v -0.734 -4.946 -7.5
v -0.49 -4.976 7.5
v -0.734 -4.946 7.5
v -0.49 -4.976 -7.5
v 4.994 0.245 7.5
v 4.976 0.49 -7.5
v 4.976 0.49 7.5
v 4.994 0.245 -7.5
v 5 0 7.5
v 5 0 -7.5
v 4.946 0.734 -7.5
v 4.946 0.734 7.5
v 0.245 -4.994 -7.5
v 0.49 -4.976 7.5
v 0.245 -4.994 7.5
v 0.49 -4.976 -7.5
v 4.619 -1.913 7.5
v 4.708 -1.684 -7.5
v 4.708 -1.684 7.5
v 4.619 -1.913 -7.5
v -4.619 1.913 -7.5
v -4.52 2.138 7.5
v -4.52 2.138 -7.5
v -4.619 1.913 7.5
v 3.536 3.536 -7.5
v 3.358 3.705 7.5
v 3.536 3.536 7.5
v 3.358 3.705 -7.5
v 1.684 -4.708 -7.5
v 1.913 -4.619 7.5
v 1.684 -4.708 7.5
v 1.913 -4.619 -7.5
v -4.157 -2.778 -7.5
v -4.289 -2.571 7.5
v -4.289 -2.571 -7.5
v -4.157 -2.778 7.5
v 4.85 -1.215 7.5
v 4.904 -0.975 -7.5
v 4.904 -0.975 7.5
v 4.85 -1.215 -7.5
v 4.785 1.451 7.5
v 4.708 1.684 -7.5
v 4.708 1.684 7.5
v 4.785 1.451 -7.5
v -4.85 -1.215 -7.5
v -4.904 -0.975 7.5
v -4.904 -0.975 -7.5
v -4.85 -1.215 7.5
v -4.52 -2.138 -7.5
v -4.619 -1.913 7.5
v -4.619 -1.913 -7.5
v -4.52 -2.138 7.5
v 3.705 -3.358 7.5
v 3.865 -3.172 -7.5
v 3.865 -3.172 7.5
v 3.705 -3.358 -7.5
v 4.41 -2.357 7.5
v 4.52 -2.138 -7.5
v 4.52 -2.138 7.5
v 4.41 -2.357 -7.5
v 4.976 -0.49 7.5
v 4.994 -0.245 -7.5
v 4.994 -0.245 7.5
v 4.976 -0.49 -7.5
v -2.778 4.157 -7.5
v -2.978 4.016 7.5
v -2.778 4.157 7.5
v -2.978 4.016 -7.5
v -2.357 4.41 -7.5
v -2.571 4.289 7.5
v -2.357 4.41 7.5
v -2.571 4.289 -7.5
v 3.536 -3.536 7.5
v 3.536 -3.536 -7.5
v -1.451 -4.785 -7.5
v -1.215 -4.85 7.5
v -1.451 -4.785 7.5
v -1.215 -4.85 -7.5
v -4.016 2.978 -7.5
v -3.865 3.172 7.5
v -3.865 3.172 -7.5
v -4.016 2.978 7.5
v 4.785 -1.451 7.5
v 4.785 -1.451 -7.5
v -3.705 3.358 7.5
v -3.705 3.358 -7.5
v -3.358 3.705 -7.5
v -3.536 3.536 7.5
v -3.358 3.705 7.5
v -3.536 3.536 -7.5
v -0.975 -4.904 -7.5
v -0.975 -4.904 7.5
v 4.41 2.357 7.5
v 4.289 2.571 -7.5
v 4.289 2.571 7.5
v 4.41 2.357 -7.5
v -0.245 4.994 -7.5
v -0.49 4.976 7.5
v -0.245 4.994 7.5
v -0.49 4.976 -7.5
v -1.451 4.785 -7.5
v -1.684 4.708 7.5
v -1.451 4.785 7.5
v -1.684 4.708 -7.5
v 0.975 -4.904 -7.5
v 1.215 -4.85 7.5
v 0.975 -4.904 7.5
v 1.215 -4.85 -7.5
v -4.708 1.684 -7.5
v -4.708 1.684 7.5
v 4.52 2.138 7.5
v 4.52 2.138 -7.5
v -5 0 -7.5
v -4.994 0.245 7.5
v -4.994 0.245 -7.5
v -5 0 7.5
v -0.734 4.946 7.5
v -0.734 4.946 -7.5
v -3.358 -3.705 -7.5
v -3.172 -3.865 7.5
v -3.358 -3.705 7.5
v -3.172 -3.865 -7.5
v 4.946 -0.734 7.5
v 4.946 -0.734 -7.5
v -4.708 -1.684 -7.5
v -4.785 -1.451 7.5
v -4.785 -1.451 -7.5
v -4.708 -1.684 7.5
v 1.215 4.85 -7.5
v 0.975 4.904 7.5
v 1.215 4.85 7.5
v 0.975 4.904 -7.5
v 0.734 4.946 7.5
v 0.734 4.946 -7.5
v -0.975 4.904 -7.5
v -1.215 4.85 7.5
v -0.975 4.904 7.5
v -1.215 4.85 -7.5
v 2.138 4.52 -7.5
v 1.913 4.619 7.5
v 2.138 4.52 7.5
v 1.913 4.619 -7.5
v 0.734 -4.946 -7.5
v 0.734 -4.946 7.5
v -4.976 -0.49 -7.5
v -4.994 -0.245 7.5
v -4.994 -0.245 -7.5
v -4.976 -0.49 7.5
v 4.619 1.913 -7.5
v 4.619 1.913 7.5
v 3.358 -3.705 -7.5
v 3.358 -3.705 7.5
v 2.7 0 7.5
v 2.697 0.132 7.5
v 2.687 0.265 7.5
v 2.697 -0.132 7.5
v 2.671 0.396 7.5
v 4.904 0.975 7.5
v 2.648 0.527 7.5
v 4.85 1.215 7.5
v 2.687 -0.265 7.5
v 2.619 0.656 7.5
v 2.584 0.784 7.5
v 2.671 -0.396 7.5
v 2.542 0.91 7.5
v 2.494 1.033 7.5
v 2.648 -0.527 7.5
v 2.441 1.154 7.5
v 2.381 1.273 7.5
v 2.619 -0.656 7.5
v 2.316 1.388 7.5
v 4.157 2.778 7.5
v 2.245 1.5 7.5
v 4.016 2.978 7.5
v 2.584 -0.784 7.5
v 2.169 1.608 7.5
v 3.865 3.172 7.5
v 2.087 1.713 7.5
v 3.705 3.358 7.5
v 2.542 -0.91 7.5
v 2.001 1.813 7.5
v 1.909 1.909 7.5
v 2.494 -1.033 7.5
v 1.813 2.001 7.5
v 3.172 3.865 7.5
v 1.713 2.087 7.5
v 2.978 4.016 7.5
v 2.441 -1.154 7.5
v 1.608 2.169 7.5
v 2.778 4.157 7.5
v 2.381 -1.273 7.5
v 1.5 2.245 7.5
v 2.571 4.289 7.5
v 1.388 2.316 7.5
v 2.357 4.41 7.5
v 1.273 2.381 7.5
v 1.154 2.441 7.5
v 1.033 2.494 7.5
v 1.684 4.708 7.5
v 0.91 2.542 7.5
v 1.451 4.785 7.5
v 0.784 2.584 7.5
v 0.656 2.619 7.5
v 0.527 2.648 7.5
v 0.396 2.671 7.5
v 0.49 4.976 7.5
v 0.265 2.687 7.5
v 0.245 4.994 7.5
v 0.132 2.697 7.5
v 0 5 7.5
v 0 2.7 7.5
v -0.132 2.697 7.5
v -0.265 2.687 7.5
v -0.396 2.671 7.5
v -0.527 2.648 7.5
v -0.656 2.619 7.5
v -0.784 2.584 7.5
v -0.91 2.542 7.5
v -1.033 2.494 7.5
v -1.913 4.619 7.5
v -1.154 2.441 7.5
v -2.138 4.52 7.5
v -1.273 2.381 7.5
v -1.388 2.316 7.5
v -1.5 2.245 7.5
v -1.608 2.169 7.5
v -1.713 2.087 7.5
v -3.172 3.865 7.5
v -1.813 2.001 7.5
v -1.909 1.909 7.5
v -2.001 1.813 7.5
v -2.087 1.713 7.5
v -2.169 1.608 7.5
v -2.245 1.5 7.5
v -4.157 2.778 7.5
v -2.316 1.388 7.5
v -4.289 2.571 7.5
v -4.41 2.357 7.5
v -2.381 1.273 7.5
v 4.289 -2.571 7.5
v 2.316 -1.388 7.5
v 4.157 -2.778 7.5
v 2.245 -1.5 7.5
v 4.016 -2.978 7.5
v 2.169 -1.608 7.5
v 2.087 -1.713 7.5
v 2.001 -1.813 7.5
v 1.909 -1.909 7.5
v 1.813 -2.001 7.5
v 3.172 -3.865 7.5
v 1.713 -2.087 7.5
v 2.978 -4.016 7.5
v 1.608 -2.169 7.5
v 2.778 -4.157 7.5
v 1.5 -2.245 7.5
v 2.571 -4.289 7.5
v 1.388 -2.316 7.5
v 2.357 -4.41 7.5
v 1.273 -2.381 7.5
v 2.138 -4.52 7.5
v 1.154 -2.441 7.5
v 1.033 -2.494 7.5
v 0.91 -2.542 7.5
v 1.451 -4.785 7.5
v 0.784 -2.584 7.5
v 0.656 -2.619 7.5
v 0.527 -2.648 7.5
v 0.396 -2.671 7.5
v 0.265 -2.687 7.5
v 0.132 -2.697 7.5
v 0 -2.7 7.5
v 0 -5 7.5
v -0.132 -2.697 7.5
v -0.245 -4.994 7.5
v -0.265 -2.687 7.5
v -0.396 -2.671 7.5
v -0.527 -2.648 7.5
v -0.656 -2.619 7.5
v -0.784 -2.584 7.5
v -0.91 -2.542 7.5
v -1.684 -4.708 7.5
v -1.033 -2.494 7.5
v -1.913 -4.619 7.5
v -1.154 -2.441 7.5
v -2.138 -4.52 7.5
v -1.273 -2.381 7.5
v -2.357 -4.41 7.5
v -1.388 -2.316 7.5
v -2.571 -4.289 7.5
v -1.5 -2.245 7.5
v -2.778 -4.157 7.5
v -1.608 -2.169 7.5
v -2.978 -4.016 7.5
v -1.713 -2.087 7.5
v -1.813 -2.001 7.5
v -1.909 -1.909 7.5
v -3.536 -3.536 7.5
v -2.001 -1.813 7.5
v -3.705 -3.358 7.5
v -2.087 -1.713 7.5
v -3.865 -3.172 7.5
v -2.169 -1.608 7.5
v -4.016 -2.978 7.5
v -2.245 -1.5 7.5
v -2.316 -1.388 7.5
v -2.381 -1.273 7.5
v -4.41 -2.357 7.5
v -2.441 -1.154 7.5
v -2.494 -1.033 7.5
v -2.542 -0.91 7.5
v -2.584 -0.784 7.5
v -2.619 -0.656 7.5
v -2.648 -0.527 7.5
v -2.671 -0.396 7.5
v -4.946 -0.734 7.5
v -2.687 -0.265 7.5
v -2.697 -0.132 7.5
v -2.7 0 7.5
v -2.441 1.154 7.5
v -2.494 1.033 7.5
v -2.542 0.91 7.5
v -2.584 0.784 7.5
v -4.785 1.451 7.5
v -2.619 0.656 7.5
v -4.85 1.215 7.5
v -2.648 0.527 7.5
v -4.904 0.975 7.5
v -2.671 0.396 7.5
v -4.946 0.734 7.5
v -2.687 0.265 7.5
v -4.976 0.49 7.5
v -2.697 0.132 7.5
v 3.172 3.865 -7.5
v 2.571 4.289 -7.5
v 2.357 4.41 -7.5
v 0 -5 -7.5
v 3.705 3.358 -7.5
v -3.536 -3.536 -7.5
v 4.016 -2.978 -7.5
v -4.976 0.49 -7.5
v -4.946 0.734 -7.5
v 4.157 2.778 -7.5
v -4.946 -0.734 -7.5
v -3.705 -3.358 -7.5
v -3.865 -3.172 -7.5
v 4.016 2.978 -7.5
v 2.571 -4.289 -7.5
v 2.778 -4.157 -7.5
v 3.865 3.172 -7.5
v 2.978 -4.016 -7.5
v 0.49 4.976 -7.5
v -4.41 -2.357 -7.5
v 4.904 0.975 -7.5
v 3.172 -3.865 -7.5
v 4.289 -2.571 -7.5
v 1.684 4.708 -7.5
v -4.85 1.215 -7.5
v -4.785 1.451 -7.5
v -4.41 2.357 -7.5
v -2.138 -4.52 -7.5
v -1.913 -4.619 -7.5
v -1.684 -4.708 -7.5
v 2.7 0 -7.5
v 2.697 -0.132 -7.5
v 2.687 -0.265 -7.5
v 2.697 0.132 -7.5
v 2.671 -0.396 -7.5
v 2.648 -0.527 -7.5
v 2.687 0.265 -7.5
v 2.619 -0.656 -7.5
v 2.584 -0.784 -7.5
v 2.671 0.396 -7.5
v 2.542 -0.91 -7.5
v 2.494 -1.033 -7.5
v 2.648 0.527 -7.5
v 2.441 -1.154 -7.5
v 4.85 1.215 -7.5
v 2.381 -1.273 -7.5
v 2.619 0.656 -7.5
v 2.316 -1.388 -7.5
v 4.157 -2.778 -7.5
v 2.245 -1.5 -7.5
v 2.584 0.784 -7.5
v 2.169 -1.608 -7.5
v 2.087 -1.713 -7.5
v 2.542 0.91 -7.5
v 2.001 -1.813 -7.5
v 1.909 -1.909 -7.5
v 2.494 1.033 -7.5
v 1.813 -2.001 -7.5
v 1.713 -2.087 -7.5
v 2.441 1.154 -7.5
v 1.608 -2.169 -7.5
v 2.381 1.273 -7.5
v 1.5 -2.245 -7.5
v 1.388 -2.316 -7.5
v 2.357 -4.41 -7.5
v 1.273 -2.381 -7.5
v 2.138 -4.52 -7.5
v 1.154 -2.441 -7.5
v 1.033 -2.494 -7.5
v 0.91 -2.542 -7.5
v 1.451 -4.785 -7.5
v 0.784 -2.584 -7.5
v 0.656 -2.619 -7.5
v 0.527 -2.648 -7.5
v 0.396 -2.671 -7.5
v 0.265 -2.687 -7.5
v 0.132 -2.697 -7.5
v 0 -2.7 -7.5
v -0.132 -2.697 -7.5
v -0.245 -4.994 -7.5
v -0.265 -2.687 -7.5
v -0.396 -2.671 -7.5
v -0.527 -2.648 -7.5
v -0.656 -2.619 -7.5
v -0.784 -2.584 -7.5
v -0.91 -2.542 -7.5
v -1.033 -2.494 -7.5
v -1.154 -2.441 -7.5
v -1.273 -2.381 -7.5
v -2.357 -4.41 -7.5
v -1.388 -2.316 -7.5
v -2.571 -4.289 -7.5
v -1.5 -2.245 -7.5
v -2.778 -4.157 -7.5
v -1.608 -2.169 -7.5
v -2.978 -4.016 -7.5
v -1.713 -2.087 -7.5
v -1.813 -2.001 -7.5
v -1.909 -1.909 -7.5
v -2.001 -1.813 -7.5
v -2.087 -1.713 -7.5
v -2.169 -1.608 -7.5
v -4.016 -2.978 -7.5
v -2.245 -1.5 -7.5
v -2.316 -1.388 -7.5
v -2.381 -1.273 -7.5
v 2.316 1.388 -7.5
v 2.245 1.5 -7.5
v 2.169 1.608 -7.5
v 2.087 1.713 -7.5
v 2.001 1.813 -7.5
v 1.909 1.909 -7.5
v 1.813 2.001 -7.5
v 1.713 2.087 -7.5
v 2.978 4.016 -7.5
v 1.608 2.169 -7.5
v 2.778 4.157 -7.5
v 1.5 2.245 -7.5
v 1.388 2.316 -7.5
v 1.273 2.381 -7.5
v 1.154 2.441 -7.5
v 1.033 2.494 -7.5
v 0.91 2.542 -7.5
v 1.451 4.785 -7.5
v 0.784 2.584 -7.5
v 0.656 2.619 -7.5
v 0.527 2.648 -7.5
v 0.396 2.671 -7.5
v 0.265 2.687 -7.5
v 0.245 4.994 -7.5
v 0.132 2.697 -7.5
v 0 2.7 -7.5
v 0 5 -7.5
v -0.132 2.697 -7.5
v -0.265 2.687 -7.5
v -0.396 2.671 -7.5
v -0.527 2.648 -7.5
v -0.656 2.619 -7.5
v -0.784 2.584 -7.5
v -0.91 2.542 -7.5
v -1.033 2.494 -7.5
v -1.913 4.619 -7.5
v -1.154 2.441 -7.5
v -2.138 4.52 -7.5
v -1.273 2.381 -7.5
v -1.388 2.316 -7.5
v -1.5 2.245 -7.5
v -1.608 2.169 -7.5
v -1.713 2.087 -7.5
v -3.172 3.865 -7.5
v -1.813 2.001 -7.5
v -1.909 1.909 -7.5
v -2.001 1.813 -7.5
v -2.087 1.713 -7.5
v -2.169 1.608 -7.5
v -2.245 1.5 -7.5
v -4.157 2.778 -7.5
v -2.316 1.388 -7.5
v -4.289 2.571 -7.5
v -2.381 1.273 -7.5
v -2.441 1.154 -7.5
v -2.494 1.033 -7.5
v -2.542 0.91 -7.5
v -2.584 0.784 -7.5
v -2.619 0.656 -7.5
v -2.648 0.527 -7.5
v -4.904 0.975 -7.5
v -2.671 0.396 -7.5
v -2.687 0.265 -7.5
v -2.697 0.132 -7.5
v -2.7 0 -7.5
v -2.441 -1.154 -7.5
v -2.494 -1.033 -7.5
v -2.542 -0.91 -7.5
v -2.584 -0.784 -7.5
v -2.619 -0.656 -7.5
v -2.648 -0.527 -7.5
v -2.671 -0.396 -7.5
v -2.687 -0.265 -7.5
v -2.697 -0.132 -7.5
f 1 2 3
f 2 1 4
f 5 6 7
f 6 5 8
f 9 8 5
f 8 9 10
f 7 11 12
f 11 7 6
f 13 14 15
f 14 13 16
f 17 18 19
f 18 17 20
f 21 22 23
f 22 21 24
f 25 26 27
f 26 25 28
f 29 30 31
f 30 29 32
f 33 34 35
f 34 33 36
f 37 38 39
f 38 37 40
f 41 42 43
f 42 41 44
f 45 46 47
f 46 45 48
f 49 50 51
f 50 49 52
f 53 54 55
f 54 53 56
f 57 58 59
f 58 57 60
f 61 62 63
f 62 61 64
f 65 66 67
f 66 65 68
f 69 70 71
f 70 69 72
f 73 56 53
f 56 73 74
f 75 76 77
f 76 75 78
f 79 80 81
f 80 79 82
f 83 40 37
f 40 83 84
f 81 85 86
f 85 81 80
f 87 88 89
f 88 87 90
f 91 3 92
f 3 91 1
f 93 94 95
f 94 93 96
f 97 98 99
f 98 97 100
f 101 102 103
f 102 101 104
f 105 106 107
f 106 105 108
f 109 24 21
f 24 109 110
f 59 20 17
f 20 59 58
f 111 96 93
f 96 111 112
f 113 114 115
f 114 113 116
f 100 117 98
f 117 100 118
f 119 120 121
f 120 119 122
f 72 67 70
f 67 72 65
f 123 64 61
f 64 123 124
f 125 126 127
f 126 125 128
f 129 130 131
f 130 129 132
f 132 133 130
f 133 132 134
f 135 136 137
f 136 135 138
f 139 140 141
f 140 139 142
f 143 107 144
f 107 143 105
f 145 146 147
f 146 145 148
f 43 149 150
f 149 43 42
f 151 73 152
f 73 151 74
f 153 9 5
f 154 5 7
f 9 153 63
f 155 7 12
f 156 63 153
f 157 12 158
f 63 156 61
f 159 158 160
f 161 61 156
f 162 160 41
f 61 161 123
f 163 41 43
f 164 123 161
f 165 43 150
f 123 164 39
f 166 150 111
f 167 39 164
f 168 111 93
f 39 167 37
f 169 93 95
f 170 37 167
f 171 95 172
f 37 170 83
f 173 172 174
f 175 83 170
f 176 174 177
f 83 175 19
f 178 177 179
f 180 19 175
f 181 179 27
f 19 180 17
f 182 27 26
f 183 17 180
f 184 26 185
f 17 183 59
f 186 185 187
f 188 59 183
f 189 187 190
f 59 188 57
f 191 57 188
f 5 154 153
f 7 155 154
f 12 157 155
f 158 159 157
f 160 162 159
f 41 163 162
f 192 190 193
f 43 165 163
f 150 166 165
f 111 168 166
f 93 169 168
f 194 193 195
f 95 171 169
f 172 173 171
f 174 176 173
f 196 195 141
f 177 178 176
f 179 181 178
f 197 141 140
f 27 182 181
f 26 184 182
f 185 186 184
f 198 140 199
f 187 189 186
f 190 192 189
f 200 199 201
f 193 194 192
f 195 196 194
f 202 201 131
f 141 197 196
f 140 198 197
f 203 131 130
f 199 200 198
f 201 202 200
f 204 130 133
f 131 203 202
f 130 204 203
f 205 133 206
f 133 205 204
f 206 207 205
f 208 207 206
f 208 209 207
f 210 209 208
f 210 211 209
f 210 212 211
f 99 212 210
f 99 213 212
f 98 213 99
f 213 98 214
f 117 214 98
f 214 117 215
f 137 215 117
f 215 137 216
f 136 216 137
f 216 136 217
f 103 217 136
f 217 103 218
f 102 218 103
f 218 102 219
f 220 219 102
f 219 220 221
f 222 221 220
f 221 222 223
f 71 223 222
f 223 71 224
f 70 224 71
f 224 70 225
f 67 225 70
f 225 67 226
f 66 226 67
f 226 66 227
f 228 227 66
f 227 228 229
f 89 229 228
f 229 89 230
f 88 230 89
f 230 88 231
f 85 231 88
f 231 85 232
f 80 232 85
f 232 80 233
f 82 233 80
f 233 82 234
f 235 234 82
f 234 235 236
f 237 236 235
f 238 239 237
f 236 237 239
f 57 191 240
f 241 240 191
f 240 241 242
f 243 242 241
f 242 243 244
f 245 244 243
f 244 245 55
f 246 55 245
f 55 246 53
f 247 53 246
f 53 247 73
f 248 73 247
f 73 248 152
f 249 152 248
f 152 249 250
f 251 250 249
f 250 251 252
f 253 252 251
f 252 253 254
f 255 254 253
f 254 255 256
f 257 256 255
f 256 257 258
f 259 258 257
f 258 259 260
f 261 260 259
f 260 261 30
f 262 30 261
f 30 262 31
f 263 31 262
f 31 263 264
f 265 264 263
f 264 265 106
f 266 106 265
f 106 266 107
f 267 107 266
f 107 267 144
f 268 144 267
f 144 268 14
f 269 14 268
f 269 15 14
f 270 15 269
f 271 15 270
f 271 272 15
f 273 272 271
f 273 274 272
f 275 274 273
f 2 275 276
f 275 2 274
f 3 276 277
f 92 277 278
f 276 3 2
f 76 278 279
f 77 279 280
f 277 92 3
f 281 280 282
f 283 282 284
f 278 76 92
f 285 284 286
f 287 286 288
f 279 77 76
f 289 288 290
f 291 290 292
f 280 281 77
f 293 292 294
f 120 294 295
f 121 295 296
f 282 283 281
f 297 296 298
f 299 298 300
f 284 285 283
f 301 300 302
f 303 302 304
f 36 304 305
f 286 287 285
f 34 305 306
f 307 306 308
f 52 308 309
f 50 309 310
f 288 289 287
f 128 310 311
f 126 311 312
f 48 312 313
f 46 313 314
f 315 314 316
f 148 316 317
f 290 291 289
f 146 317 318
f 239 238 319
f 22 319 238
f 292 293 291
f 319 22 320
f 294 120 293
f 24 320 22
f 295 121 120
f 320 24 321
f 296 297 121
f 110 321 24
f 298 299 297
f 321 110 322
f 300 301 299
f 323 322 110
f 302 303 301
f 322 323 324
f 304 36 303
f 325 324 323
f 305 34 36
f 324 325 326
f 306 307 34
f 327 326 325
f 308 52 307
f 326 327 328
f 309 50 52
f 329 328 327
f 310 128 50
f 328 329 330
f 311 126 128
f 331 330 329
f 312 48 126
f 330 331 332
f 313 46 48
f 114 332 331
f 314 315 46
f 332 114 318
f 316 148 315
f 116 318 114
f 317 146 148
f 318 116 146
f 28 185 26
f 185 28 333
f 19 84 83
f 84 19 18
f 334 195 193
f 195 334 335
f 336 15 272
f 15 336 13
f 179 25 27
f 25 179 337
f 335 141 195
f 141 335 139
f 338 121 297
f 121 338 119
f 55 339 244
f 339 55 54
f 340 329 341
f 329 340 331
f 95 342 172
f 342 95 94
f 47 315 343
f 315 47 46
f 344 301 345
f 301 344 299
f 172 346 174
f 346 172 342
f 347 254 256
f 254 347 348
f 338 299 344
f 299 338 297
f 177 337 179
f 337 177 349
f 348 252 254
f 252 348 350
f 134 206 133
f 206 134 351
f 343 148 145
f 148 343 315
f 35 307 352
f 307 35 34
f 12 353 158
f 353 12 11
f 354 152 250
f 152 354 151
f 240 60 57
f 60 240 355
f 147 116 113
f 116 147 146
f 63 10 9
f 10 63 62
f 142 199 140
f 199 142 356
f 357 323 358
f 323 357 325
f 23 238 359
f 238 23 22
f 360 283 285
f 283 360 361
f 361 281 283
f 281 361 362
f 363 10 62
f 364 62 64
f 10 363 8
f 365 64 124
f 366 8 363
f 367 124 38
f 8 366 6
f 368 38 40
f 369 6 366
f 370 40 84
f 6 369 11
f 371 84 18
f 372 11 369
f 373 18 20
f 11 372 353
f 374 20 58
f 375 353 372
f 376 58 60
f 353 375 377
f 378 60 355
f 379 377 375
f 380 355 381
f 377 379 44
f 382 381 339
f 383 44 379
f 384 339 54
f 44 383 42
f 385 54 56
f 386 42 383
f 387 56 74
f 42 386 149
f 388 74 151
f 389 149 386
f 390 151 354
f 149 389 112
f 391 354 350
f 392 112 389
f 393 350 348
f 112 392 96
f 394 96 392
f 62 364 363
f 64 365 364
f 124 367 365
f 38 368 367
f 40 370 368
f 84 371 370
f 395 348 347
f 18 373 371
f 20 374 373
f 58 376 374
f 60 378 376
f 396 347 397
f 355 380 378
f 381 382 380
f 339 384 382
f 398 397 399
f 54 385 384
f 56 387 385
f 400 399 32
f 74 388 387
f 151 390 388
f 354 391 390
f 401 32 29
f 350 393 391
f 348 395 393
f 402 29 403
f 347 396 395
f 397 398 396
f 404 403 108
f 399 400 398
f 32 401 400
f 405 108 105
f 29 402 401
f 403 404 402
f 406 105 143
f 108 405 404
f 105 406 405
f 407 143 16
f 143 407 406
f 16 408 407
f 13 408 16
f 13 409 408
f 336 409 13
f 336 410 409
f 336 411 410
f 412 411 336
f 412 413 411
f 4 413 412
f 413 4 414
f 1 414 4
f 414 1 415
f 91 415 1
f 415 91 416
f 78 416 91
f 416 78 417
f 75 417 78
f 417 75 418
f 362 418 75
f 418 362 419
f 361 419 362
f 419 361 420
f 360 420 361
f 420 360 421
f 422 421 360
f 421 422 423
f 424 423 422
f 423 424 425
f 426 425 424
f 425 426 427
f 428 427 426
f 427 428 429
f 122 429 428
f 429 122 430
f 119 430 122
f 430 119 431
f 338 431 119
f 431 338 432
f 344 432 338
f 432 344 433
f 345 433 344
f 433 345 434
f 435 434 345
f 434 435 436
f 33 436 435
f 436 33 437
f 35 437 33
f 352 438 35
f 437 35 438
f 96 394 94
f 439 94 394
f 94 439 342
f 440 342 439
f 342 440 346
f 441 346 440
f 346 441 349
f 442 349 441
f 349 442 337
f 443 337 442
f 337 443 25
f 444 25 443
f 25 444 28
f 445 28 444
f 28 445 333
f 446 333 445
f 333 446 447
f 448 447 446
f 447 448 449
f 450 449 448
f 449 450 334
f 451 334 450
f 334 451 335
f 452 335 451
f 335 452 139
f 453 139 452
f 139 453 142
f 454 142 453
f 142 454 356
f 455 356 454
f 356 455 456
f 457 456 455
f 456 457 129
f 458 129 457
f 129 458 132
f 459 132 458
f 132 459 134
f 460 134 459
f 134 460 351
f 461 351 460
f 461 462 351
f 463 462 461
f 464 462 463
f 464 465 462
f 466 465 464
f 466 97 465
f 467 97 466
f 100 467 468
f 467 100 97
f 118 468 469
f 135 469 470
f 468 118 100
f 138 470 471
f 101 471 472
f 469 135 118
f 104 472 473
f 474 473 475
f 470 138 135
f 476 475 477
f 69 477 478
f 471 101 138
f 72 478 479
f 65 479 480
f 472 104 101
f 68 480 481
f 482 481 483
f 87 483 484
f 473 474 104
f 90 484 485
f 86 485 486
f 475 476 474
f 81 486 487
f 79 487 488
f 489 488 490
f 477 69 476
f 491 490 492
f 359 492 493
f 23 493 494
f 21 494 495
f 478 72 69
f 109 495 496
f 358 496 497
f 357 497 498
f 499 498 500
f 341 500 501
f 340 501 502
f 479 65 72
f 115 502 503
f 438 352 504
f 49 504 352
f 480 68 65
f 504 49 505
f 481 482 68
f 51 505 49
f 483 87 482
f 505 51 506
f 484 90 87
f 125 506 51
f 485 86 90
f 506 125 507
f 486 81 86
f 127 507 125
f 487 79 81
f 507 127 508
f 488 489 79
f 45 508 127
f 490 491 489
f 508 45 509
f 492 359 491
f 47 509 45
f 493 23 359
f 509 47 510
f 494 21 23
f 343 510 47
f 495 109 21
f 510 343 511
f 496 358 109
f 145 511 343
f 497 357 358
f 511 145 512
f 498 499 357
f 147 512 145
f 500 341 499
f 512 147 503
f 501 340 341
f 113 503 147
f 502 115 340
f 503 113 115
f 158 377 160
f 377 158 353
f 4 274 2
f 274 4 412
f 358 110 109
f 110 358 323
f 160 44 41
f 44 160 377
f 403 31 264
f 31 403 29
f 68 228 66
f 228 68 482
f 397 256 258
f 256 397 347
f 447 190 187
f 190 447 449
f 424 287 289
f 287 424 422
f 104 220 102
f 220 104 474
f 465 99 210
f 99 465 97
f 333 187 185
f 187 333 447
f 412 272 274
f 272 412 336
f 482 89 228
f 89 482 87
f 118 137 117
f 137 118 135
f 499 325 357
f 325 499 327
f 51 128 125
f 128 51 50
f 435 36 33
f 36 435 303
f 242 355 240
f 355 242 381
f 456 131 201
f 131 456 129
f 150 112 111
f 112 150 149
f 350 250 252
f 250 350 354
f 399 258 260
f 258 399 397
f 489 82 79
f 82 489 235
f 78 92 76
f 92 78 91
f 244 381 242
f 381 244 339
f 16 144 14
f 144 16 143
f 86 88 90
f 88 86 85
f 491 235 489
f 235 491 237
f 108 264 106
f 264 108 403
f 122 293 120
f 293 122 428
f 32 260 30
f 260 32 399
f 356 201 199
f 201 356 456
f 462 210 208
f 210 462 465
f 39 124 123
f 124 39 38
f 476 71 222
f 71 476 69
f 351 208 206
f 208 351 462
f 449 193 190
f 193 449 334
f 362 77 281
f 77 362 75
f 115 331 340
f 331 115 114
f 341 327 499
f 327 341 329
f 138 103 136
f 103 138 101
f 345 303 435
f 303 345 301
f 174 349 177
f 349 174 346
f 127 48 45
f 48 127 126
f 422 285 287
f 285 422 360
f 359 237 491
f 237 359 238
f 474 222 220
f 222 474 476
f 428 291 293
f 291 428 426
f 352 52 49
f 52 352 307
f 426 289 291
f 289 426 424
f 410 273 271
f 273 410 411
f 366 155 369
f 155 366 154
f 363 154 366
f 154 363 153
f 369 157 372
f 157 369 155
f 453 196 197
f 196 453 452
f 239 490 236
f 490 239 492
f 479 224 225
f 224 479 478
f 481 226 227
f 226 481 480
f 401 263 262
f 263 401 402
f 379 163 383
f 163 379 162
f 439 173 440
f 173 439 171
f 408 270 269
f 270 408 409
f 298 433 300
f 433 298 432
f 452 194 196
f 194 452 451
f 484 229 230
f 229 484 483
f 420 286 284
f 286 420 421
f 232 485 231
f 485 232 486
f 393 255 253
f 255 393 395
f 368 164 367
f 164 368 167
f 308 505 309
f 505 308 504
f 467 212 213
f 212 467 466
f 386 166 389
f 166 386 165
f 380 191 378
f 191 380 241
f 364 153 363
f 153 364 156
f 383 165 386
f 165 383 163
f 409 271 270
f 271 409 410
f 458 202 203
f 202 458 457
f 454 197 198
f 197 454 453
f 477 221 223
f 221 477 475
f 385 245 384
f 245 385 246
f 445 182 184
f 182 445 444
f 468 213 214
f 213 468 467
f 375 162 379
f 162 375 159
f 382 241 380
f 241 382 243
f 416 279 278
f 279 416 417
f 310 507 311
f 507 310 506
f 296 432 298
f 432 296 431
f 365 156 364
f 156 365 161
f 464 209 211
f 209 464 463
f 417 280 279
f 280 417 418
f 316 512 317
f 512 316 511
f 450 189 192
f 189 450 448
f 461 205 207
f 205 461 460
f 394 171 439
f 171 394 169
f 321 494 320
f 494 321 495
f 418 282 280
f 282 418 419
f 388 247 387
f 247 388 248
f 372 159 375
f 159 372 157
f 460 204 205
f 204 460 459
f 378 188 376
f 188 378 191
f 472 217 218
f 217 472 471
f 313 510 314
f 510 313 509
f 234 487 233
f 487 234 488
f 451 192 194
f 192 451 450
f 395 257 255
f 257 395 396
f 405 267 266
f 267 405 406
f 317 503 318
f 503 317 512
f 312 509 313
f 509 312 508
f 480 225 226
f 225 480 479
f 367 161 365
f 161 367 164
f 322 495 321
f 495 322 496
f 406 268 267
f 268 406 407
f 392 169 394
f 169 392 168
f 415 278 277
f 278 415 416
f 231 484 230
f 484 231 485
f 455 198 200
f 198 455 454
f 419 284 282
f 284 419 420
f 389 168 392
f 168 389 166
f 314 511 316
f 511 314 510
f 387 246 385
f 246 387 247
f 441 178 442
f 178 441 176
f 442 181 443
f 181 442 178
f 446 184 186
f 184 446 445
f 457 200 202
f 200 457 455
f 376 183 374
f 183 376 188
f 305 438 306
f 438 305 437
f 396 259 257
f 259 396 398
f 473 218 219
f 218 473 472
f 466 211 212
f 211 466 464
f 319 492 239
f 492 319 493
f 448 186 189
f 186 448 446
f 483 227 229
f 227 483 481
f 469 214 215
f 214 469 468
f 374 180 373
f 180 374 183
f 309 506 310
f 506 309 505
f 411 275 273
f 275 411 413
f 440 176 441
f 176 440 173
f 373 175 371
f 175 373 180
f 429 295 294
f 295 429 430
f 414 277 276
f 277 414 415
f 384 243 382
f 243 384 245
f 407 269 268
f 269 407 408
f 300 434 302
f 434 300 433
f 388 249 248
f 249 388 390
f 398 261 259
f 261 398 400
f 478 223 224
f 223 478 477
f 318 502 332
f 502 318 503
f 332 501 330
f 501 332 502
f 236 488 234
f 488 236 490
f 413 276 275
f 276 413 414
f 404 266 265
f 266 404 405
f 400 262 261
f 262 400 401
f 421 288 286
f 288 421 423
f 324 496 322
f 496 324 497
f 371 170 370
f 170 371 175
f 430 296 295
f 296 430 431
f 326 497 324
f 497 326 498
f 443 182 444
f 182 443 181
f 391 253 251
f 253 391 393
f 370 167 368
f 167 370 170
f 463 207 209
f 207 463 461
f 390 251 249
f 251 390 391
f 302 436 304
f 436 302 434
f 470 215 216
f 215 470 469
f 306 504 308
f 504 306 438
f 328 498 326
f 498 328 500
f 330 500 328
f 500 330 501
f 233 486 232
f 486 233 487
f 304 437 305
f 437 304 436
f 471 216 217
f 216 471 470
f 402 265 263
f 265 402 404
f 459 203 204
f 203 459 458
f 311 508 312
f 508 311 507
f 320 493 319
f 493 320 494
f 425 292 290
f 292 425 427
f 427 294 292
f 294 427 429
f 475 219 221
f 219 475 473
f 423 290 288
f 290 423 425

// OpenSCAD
// Linear bearing: 5.0mm bore, 10.0mm OD, 15.0mm length
// One connected solid (single sleeve with through bore)

// Parameters
bore_diameter_mm  = 5.0;   // bore
outer_diameter_mm = 10.0;  // OD
length_mm         = 15.0;  // length

eps_mm = 0.2;              // clearance / robustness for boolean ops

$fn = 128;

module linear_bearing_5x10x15() {
    difference() {
        // Outer sleeve
        cylinder(d=outer_diameter_mm, h=length_mm, center=true);

        // Through bore (slightly oversized for clean subtraction)
        cylinder(d=bore_diameter_mm + 2*eps_mm, h=length_mm + 2*eps_mm, center=true);
    }
}

linear_bearing_5x10x15();
